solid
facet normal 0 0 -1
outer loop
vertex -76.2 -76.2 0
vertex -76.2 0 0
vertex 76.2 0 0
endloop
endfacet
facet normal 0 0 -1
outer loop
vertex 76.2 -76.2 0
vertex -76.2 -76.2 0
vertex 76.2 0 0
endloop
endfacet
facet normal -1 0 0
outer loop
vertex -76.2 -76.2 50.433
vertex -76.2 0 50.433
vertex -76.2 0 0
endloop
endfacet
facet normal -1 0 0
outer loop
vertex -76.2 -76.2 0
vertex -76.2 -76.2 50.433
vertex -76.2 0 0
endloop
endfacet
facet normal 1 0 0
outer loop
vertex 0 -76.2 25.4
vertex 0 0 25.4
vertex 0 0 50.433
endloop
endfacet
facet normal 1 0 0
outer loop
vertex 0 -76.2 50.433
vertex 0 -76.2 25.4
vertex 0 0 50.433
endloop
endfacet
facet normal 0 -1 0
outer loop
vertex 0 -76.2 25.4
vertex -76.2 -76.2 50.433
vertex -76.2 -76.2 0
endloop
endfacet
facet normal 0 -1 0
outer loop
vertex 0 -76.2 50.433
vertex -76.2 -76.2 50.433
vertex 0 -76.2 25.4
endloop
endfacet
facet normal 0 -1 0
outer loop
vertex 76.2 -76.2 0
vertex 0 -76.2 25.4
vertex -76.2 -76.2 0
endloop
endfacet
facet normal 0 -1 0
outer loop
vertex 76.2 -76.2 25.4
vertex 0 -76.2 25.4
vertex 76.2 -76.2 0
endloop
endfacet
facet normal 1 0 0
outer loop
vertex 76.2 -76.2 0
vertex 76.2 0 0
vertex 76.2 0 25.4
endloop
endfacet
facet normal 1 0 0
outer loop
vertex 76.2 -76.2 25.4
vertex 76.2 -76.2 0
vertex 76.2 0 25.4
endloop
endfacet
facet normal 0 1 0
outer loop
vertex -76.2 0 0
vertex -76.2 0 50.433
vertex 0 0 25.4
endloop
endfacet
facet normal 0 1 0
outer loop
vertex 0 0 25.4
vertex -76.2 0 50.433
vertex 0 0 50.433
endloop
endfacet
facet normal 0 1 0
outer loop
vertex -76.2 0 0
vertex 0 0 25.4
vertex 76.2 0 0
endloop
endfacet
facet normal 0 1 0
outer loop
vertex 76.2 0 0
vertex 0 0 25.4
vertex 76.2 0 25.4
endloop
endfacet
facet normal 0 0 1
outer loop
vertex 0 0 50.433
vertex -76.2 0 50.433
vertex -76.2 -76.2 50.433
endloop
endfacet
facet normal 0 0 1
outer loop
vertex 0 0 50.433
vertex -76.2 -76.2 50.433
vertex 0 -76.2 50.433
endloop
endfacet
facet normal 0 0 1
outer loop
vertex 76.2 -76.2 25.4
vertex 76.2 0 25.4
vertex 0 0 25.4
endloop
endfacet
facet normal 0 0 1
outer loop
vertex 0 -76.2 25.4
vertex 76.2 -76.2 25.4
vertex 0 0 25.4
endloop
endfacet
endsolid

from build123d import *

# Parameters (mm, degrees)
F1_DEPTH = 76.2
F2_W     = 76.2
F2_H     = 25.4
F3_DEPTH = 76.2


with BuildPart() as f1:
    # F0 (on Front) → F1 (new body)
    with BuildSketch(Plane.XZ):
        Polygon((-76.2, 25.4), (-76.2, 0), (76.2, 0), (76.2, 25.4), (0, 25.4), align=None)
    extrude(amount=F1_DEPTH)

    # F2 (on Front) → F3 (join)
    with BuildSketch(Plane.XZ):
        with Locations((-38.1, 37.732552)):
            Rectangle(F2_W, F2_H)
    extrude(amount=F3_DEPTH)


solid = f1.part
